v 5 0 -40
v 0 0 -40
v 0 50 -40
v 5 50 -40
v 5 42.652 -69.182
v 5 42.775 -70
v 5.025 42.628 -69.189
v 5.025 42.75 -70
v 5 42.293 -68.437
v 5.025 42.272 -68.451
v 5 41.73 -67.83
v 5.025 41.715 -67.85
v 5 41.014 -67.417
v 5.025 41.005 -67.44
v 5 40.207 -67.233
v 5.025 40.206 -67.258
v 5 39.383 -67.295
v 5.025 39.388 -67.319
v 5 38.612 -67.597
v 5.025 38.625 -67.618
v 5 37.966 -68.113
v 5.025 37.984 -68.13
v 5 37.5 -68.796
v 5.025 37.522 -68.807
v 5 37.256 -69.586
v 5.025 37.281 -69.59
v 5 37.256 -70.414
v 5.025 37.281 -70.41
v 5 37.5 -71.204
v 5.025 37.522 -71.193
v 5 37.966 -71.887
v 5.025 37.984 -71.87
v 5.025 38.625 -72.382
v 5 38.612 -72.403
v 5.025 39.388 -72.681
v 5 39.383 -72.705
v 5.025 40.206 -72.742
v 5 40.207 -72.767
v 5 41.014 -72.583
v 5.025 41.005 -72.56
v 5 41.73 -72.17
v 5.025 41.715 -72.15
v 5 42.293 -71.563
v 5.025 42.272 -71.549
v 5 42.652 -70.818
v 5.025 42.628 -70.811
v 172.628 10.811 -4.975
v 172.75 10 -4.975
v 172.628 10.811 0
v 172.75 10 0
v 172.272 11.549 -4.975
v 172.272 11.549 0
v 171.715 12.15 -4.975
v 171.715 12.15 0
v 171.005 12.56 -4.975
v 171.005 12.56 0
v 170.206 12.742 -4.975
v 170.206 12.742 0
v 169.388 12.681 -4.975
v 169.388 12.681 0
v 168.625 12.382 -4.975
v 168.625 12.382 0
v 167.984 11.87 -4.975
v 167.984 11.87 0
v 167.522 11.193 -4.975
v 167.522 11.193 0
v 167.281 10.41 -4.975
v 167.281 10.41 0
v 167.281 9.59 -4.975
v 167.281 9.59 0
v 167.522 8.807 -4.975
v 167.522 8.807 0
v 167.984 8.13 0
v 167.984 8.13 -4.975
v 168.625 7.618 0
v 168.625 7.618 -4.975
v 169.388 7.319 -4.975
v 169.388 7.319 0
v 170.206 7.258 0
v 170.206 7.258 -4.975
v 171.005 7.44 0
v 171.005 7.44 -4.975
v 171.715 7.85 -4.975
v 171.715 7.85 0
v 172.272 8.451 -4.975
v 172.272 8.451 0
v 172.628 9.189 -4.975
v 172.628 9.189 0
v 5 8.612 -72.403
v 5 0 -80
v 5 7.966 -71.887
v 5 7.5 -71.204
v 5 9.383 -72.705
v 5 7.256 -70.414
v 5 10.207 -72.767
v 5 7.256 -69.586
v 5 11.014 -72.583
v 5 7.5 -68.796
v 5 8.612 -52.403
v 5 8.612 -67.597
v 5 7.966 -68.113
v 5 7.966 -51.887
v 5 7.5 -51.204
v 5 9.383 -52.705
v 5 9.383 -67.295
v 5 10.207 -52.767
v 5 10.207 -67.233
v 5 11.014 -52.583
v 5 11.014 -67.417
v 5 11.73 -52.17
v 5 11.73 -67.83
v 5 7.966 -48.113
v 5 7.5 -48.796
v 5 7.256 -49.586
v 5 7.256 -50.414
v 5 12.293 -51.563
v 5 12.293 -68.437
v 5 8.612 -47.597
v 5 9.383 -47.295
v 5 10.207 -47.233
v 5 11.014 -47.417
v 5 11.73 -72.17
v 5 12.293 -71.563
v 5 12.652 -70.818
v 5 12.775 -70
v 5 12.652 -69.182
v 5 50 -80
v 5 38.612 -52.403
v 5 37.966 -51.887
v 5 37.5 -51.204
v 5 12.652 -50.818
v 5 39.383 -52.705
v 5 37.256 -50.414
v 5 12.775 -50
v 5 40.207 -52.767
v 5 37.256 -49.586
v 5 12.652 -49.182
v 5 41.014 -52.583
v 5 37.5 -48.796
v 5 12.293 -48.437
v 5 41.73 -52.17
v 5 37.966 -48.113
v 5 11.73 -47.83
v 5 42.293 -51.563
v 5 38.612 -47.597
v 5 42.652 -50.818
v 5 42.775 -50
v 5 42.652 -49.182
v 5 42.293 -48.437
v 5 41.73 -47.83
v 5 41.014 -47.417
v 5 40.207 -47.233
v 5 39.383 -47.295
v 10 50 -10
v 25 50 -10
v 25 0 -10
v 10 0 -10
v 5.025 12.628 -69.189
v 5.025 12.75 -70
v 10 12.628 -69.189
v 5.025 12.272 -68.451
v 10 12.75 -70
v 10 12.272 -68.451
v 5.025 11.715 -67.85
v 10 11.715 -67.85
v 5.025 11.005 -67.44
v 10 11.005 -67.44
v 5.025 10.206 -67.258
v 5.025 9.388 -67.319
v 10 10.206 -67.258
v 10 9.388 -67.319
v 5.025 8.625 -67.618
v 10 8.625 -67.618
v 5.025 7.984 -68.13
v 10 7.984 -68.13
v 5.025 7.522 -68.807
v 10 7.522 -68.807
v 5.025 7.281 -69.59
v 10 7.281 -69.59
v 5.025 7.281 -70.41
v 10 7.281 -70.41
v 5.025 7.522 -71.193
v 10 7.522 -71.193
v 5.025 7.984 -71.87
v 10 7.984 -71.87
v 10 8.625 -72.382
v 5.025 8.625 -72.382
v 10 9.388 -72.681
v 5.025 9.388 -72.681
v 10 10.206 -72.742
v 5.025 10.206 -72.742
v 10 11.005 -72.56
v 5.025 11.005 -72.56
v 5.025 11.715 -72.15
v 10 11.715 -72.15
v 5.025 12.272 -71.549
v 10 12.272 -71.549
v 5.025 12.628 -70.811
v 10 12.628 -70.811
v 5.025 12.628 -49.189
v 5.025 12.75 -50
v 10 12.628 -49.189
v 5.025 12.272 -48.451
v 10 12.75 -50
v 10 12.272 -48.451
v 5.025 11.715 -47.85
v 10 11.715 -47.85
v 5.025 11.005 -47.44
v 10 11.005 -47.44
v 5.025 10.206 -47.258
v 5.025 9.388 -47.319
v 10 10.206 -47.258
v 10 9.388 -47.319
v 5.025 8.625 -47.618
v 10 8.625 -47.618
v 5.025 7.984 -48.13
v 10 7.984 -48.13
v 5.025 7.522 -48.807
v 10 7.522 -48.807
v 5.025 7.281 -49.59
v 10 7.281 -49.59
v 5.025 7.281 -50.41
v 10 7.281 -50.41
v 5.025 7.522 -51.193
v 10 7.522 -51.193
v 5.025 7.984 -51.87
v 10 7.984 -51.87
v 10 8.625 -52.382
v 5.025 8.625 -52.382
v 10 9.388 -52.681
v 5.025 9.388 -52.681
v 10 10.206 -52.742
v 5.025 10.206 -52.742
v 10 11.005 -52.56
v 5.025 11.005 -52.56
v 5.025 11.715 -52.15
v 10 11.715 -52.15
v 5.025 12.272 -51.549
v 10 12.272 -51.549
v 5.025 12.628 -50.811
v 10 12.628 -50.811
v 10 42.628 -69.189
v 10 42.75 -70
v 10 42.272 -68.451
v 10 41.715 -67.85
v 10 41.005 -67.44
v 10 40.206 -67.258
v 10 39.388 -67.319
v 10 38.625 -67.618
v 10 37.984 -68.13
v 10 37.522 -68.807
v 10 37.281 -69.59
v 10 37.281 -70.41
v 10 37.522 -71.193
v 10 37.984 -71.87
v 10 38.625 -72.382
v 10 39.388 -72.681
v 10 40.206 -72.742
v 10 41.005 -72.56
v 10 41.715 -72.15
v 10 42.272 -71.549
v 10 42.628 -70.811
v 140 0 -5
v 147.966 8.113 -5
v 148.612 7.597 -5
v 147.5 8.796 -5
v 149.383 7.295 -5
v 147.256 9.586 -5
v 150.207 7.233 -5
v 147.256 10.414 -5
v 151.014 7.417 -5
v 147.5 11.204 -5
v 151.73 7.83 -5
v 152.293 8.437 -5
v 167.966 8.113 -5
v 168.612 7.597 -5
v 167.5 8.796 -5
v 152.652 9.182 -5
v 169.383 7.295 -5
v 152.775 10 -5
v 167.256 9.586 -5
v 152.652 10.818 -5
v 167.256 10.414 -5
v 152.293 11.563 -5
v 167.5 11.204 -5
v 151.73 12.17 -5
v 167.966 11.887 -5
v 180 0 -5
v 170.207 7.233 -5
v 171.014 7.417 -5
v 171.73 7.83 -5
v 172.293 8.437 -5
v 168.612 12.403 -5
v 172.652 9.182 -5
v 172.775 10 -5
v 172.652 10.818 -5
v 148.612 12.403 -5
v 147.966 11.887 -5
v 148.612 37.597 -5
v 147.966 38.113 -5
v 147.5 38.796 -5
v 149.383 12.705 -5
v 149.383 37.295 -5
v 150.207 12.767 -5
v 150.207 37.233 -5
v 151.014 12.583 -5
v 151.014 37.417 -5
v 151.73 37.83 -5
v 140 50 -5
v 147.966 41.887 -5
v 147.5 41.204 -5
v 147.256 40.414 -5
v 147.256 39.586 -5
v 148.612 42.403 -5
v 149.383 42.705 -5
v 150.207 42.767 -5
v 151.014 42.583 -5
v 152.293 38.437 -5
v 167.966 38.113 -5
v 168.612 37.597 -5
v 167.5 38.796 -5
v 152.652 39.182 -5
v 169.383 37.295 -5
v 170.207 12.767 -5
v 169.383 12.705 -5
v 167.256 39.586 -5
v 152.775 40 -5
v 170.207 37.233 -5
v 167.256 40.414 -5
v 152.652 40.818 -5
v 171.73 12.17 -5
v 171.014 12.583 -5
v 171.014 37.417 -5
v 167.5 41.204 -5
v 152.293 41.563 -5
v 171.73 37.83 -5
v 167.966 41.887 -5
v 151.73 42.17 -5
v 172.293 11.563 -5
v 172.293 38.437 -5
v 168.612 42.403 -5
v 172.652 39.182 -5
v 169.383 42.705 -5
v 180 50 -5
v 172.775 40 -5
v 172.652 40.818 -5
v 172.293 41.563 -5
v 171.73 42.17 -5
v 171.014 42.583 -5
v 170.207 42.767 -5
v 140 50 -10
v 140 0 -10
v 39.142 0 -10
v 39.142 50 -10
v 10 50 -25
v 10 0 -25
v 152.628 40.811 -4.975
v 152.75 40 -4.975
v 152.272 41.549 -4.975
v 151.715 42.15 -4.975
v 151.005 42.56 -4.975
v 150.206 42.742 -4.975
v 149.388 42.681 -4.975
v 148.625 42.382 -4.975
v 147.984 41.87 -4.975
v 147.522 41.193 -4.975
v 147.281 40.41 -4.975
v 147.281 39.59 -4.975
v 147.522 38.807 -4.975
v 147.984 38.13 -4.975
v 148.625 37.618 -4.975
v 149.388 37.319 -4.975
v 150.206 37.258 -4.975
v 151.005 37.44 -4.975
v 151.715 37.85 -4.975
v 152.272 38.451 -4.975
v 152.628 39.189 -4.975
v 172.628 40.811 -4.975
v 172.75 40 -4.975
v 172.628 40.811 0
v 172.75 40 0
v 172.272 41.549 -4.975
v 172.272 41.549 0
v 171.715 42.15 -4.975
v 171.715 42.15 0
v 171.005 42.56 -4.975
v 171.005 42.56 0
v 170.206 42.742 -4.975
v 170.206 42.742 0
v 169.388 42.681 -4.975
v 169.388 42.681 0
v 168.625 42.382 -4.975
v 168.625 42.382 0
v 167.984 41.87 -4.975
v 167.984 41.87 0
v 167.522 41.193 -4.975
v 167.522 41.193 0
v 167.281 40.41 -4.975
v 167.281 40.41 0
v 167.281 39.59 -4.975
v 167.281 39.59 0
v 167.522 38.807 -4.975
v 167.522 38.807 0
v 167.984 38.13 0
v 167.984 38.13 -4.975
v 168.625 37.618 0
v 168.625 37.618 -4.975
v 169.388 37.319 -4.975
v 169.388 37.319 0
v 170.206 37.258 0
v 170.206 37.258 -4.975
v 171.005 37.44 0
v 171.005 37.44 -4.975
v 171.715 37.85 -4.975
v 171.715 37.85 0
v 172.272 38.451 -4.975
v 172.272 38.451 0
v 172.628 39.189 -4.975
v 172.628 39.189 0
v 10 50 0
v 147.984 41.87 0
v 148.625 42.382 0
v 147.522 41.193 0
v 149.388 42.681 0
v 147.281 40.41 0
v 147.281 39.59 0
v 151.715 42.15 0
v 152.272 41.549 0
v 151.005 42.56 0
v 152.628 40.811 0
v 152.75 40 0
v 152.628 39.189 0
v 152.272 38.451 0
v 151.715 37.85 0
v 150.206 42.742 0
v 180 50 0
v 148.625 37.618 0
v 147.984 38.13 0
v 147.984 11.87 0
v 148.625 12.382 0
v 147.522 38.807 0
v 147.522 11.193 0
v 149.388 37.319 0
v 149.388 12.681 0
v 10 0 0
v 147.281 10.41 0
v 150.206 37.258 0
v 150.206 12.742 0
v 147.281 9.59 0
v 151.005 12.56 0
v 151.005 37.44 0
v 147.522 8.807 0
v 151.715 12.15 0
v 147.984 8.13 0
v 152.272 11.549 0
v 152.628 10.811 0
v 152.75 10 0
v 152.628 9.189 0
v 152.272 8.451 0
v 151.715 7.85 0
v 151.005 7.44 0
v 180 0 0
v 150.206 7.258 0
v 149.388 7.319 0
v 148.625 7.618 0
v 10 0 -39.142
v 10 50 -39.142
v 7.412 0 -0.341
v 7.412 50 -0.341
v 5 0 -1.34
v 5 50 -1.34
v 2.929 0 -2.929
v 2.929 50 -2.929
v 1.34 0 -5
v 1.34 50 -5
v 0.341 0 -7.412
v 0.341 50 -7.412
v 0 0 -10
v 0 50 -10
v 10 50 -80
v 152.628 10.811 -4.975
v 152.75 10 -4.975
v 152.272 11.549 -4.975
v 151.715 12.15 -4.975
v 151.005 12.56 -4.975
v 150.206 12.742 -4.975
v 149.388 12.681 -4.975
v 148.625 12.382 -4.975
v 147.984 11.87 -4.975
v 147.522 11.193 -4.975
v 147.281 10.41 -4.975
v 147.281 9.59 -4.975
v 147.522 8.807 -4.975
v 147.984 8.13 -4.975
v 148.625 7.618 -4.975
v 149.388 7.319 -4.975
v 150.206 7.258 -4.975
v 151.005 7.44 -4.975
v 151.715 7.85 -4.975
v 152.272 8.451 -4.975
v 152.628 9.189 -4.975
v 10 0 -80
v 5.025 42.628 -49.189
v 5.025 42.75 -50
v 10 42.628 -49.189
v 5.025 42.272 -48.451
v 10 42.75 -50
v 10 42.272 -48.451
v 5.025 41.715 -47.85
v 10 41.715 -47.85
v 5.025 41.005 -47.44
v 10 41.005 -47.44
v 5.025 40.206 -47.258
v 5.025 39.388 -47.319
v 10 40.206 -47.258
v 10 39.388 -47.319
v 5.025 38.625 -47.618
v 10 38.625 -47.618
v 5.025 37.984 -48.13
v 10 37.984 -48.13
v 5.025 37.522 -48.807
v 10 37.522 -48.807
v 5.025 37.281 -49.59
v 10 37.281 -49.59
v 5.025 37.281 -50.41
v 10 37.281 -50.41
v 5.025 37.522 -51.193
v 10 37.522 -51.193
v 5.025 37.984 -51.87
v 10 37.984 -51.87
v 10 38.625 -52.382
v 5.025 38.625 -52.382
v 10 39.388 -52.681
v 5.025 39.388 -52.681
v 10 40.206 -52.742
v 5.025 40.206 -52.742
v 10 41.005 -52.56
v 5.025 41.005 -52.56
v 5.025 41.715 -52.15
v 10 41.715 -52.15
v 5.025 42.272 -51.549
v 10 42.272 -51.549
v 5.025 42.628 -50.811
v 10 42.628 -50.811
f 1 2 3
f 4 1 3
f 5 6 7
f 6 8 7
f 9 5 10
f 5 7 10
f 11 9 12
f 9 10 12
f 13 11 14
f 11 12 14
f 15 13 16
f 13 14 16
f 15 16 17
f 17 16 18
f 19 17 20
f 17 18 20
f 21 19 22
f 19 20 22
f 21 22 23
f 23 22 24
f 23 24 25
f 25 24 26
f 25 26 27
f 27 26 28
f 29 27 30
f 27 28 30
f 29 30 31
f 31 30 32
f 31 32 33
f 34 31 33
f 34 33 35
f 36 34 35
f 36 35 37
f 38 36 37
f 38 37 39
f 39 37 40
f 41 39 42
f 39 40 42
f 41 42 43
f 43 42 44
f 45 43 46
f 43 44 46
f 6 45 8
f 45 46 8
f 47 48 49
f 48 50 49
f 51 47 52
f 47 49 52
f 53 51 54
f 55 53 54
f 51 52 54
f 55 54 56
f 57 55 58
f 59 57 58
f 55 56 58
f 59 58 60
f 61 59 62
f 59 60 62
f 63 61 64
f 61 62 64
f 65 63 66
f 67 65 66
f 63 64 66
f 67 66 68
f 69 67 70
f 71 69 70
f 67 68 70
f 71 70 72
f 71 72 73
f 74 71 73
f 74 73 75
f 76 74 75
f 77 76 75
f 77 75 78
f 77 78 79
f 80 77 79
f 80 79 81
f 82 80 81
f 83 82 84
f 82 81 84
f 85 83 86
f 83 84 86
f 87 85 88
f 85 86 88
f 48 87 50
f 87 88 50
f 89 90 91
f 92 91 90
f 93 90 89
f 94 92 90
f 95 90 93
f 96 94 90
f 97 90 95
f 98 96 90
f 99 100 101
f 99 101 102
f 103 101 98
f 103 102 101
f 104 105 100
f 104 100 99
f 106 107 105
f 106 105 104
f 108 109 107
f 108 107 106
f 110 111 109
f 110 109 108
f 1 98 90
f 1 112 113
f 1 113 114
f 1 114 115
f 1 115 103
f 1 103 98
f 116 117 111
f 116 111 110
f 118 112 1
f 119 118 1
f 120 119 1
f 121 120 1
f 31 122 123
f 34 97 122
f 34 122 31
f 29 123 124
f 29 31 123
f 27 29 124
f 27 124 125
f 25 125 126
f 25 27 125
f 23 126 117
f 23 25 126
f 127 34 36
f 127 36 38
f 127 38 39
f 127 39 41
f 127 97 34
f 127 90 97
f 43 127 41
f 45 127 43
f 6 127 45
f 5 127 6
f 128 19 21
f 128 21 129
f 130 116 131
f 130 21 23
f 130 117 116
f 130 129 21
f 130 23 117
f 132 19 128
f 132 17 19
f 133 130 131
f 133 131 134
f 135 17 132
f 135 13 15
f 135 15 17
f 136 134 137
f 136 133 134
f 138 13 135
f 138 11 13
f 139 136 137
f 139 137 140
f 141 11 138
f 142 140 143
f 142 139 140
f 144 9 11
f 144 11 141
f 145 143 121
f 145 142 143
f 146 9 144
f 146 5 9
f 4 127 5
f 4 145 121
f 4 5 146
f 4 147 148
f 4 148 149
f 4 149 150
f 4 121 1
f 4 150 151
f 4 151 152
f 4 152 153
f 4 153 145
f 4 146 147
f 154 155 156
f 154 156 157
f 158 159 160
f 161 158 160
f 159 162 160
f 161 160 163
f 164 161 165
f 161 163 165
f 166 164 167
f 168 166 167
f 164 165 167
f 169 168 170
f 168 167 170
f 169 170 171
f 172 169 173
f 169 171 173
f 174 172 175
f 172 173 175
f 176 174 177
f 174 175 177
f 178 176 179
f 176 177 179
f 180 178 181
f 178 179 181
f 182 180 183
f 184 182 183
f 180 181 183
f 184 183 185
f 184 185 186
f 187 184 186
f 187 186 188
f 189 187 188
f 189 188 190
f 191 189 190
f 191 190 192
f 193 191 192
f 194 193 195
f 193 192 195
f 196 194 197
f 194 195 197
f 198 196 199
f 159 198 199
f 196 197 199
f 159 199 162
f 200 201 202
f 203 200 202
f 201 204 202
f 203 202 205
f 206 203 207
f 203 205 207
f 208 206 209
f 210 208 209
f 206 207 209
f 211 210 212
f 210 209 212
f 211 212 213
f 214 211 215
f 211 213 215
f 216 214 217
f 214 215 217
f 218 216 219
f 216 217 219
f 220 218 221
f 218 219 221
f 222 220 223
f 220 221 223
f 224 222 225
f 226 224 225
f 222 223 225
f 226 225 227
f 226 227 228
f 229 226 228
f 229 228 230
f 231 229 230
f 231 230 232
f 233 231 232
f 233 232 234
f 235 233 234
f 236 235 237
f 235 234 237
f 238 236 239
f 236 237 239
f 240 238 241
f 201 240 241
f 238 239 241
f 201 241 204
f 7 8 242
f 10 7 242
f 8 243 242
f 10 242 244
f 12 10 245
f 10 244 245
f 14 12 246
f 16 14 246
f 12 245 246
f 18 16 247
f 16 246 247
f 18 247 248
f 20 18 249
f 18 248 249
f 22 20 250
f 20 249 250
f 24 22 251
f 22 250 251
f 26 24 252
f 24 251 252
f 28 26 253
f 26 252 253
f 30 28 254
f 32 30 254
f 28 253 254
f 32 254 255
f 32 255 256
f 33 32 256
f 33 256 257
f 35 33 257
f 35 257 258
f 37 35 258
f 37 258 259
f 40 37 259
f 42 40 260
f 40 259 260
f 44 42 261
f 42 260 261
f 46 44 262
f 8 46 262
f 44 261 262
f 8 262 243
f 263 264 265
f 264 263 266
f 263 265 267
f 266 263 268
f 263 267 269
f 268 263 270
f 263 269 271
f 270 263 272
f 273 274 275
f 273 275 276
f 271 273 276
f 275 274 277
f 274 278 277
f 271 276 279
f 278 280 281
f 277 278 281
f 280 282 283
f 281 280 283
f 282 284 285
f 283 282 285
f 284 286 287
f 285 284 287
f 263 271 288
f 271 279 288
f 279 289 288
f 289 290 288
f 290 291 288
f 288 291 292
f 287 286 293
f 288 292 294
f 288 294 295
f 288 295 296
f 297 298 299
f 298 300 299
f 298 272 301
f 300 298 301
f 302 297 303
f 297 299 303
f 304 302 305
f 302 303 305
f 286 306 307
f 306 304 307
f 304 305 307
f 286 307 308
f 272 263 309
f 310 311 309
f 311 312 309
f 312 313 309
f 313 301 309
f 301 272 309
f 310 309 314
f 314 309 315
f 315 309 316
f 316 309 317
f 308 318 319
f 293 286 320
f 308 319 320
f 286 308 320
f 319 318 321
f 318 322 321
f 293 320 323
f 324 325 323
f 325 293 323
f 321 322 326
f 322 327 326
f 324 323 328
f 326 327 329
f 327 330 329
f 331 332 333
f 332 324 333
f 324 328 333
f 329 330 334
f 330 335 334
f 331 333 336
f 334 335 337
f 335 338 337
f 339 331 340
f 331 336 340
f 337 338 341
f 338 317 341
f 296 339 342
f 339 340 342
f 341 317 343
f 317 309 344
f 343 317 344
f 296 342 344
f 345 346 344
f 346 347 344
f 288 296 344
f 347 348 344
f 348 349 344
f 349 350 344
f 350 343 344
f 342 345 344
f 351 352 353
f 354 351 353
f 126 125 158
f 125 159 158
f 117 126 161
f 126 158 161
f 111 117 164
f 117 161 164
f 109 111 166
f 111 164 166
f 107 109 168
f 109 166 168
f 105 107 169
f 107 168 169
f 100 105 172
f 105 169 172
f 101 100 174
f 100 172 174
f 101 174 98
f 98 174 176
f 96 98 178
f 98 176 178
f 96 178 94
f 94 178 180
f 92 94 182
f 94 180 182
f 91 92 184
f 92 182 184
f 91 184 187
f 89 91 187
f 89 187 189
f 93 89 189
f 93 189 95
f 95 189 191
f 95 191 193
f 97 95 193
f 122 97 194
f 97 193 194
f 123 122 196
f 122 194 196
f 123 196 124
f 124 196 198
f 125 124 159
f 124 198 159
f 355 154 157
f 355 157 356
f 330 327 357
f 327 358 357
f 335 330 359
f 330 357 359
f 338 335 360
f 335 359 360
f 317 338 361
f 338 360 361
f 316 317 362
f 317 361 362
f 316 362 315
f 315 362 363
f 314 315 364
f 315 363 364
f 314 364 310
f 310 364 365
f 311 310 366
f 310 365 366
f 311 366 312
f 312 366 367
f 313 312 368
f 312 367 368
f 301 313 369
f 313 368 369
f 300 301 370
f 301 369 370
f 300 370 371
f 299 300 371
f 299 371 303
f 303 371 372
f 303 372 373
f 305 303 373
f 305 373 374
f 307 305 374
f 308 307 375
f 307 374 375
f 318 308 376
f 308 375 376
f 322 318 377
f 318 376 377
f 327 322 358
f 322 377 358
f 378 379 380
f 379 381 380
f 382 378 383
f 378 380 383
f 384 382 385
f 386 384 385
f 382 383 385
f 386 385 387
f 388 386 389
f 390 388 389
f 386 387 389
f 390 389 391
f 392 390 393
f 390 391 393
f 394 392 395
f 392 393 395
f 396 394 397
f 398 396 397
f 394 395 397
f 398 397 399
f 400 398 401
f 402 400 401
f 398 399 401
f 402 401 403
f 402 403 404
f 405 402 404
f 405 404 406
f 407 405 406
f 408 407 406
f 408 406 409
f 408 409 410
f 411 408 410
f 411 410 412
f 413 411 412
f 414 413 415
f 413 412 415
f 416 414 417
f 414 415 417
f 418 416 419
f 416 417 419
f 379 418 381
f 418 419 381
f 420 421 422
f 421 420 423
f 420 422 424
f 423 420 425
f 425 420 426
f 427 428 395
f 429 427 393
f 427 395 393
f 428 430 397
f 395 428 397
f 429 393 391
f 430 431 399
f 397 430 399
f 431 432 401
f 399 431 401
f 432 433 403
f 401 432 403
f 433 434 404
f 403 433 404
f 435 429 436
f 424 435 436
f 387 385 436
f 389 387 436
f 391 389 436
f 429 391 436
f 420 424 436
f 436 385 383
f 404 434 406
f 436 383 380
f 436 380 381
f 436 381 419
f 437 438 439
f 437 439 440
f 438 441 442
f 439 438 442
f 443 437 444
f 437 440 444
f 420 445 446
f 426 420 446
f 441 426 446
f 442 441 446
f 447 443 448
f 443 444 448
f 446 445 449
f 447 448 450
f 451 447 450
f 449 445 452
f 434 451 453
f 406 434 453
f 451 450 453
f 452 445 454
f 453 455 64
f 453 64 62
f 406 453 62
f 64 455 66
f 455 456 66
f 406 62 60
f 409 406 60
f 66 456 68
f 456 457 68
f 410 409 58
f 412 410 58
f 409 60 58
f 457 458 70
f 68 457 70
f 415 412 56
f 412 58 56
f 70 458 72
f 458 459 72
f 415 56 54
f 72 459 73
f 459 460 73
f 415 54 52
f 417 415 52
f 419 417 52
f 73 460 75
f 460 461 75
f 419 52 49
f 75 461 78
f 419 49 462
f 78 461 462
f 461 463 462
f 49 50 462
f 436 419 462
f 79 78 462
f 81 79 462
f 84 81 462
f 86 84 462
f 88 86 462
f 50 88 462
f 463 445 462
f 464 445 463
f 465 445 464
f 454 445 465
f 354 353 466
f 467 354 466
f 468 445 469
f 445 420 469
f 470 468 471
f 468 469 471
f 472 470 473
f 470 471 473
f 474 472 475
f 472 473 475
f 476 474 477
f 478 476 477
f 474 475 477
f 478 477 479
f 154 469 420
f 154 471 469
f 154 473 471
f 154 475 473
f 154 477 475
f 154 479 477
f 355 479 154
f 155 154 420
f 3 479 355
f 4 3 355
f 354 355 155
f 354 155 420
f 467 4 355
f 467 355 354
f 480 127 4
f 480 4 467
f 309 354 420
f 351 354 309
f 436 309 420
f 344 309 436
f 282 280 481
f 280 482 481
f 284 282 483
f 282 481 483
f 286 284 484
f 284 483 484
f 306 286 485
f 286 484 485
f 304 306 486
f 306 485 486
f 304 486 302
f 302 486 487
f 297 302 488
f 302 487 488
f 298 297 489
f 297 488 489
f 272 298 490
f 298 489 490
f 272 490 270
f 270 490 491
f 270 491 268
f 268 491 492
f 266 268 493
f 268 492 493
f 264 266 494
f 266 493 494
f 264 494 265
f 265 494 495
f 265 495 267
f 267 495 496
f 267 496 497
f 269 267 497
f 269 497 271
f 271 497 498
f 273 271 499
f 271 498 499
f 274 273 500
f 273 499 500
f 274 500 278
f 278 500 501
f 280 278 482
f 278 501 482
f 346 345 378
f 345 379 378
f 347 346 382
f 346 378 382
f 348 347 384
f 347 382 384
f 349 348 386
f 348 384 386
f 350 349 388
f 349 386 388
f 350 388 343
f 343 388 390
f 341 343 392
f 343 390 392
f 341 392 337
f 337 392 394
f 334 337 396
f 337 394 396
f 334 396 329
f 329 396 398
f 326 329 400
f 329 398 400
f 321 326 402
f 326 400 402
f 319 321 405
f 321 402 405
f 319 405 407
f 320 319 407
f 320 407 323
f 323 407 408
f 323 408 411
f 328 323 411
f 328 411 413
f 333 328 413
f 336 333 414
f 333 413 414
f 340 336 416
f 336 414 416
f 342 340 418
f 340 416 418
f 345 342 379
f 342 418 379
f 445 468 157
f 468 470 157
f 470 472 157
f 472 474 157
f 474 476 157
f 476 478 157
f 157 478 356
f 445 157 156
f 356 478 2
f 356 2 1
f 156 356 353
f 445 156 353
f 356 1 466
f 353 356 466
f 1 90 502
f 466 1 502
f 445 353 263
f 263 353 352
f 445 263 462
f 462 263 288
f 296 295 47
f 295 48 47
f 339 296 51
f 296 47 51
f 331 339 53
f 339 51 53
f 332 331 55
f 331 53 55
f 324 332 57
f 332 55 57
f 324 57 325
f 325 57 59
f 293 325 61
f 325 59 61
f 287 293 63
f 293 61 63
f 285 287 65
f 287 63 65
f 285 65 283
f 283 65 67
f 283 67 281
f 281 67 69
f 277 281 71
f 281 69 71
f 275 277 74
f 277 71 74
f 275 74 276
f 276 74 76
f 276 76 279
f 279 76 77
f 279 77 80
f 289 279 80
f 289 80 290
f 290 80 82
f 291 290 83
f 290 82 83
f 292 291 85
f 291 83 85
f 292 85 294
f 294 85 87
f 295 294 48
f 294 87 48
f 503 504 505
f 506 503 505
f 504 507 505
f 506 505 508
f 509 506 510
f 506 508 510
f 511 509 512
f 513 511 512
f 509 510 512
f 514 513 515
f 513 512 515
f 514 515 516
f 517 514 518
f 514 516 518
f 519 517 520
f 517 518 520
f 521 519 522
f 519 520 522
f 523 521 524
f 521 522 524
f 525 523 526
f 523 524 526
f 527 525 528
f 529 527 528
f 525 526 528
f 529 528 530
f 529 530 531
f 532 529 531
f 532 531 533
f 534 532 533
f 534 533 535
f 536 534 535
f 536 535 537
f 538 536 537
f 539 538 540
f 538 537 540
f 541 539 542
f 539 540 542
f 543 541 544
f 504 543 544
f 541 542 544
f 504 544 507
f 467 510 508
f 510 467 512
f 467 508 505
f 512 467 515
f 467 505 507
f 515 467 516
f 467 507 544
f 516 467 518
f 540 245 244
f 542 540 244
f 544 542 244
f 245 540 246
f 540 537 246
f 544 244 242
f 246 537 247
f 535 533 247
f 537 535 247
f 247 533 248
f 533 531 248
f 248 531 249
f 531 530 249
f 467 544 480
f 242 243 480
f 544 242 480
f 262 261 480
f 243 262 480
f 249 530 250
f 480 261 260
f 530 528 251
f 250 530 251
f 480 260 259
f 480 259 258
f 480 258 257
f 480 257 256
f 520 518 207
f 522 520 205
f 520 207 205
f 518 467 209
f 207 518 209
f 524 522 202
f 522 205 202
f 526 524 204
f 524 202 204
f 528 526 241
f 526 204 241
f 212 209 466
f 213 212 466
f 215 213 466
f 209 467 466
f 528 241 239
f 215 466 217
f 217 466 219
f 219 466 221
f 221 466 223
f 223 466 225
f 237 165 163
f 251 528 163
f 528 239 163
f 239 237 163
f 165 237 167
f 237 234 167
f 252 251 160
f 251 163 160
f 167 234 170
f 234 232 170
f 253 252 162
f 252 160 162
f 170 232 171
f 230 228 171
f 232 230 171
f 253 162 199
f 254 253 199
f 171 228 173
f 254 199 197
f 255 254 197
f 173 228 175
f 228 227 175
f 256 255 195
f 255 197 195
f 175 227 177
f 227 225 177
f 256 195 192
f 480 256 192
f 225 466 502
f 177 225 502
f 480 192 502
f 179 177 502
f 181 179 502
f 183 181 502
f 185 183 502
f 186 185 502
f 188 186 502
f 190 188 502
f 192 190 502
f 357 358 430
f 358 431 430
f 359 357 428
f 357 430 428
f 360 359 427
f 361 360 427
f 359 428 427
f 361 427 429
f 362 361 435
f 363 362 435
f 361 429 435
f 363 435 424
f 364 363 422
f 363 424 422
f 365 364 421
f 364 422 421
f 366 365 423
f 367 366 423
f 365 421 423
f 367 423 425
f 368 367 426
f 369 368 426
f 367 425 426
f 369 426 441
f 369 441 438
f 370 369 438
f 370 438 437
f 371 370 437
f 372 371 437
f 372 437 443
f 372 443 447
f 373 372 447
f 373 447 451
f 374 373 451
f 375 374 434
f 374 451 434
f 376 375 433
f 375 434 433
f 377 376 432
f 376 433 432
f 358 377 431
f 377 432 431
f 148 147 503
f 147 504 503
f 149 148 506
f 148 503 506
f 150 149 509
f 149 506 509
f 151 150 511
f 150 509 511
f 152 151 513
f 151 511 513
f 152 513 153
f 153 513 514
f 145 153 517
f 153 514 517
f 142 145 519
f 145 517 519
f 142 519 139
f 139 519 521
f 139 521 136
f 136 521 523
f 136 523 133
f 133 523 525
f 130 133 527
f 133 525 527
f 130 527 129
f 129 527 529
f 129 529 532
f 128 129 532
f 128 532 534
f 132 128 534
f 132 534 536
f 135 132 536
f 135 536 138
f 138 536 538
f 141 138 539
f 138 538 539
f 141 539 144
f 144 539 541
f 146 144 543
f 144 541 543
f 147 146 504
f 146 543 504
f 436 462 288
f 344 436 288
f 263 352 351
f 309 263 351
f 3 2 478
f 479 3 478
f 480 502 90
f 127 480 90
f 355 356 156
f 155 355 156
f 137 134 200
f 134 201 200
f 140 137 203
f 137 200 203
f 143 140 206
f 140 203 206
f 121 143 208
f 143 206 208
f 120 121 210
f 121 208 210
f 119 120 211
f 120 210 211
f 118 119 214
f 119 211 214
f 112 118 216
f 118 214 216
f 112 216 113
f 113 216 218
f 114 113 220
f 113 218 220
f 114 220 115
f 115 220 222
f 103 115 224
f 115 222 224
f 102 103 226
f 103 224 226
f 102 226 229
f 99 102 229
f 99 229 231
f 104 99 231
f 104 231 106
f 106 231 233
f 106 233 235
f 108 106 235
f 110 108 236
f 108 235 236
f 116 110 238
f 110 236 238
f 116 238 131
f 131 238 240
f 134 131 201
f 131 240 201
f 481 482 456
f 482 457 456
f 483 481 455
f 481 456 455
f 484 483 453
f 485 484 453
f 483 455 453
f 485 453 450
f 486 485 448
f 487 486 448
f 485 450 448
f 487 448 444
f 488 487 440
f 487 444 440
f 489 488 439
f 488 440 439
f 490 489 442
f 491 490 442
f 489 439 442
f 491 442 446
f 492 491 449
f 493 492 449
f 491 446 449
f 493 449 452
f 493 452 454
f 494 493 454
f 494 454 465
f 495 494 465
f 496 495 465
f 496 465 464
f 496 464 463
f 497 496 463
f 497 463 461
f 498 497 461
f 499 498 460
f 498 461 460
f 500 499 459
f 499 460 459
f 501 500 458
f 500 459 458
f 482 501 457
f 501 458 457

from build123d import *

# Parameters (mm, degrees)
BOSS_EXTRUDE1_DEPTH = 50
SKETCH3_W           = 40
SKETCH3_H           = 50
CUT_EXTRUDE1_DEPTH  = 5
SKETCH7_W           = 40
SKETCH7_H           = 50
CUT_EXTRUDE2_DEPTH  = 5
FILLET1_R           = 10


# Read off the part's stored shape, not the designer's step: M5 Clearance Hole1, M5 Clearance Hole2
with BuildPart() as part:
    # Sketch1 → Boss-Extrude1 (new body)
    with BuildSketch(Plane(origin=(0, 0, 0), x_dir=(1, 0, 0), z_dir=(0, 1, 0))):
        Polygon((10, 10), (10, 80), (0, 80), (0, 0), (180, 0), (180, 10), align=None)
        Polygon((39.142135624, 10), (10, 39.142135624), (10, 25), (25, 10), align=None)
    extrude(amount=BOSS_EXTRUDE1_DEPTH)

    # Sketch3 → Cut-Extrude1 (cut)
    with BuildSketch(Plane.XY.offset(-10)):
        with Locations((160, 25)):
            Rectangle(SKETCH3_W, SKETCH3_H)
    extrude(amount=CUT_EXTRUDE1_DEPTH, mode=Mode.SUBTRACT)

    # M5 Clearance Hole1 outline → M5 Clearance Hole1 (revolve, cut)
    with BuildSketch(Plane(origin=(170, 40, 0), x_dir=(1, 0, 0), z_dir=(0, -1, 0))):
        Polygon((2.75, -4.975), (2.75, 0), (0, 0), (0, -5), (2.775, -5), align=None)
    revolve(axis=Axis((170, 40, 0), (0, 0, 1)), mode=Mode.SUBTRACT)

    # M5 Clearance Hole1 2 outline → M5 Clearance Hole1 2 (revolve, cut)
    with BuildSketch(Plane(origin=(150, 40, 0), x_dir=(1, 0, 0), z_dir=(0, -1, 0))):
        Polygon((2.75, -4.975), (2.75, 0), (0, 0), (0, -5), (2.775, -5), align=None)
    revolve(axis=Axis((150, 40, 0), (0, 0, 1)), mode=Mode.SUBTRACT)

    # M5 Clearance Hole1 3 outline → M5 Clearance Hole1 3 (revolve, cut)
    with BuildSketch(Plane(origin=(150, 10, 0), x_dir=(1, 0, 0), z_dir=(0, -1, 0))):
        Polygon((2.75, -4.975), (2.75, 0), (0, 0), (0, -5), (2.775, -5), align=None)
    revolve(axis=Axis((150, 10, 0), (0, 0, 1)), mode=Mode.SUBTRACT)

    # M5 Clearance Hole1 4 outline → M5 Clearance Hole1 4 (revolve, cut)
    with BuildSketch(Plane(origin=(170, 10, 0), x_dir=(1, 0, 0), z_dir=(0, -1, 0))):
        Polygon((2.75, -4.975), (2.75, 0), (0, 0), (0, -5), (2.775, -5), align=None)
    revolve(axis=Axis((170, 10, 0), (0, 0, 1)), mode=Mode.SUBTRACT)

    # Sketch7 → Cut-Extrude2 (cut)
    with BuildSketch(Plane.ZY):
        with Locations((-60, 25)):
            Rectangle(SKETCH7_W, SKETCH7_H)
    extrude(amount=-CUT_EXTRUDE2_DEPTH, mode=Mode.SUBTRACT)

    # M5 Clearance Hole2 outline → M5 Clearance Hole2 (revolve, cut)
    with BuildSketch(Plane(origin=(0, 40, -70), x_dir=(0, 1, 0), z_dir=(0, 0, -1))):
        Polygon((2.75, 5.025), (2.75, 10), (0, 10), (0, 5), (2.775, 5), align=None)
    revolve(axis=Axis((0, 40, -70), (1, 0, 0)), mode=Mode.SUBTRACT)

    # M5 Clearance Hole2 2 outline → M5 Clearance Hole2 2 (revolve, cut)
    with BuildSketch(Plane(origin=(0, 10, -70), x_dir=(0, 1, 0), z_dir=(0, 0, -1))):
        Polygon((2.75, 5.025), (2.75, 10), (0, 10), (0, 5), (2.775, 5), align=None)
    revolve(axis=Axis((0, 10, -70), (1, 0, 0)), mode=Mode.SUBTRACT)

    # M5 Clearance Hole2 3 outline → M5 Clearance Hole2 3 (revolve, cut)
    with BuildSketch(Plane(origin=(0, 40, -50), x_dir=(0, 1, 0), z_dir=(0, 0, -1))):
        Polygon((2.75, 5.025), (2.75, 10), (0, 10), (0, 5), (2.775, 5), align=None)
    revolve(axis=Axis((0, 40, -50), (1, 0, 0)), mode=Mode.SUBTRACT)

    # M5 Clearance Hole2 4 outline → M5 Clearance Hole2 4 (revolve, cut)
    with BuildSketch(Plane(origin=(0, 10, -50), x_dir=(0, 1, 0), z_dir=(0, 0, -1))):
        Polygon((2.75, 5.025), (2.75, 10), (0, 10), (0, 5), (2.775, 5), align=None)
    revolve(axis=Axis((0, 10, -50), (1, 0, 0)), mode=Mode.SUBTRACT)

    # Fillet1
    fillet1_edges = [part.edges().sort_by_distance(p)[0] for p in [
        (0, 25, 0),
    ]]
    fillet(fillet1_edges, radius=FILLET1_R)


solid = part.part
